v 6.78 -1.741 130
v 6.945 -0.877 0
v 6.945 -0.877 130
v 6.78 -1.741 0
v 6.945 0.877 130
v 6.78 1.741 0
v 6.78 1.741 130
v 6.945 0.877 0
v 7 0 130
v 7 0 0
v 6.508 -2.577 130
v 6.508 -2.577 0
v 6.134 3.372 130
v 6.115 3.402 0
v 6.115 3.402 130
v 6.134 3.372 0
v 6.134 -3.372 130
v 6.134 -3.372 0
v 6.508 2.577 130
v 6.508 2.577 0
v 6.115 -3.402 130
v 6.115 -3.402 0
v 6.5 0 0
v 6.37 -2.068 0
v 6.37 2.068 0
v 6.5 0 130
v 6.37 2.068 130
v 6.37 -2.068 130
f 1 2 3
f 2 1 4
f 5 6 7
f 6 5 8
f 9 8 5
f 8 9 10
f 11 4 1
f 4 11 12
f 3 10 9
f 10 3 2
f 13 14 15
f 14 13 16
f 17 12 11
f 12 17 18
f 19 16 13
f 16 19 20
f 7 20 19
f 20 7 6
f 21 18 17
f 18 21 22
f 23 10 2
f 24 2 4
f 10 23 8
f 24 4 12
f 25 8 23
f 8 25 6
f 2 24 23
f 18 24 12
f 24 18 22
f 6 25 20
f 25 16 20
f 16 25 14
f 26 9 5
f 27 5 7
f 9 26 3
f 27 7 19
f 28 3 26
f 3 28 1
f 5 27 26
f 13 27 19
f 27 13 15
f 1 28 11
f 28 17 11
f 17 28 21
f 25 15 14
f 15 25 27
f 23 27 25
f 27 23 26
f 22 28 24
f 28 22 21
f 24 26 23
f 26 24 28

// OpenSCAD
$fn = 50;


difference() {
	union() {
		cylinder(h = 130, r = 7.0000000000);
		translate(v = [-13.0000000000, 0, 0]) {
			cylinder(h = 130, r = 7.0000000000);
		}
	}
	union() {
		cylinder(h = 130, r = 3.2500000000);
		cylinder(h = 130, r = 1.8000000000);
		cylinder(h = 130, r = 1.8000000000);
		cylinder(h = 130, r = 1.8000000000);
		translate(v = [-17.5000000000, 0, 0]) {
			hull() {
				translate(v = [-3.7500000000, 0.0000000000, 0]) {
					cylinder(h = 130, r = 10.5000000000);
				}
				translate(v = [3.7500000000, 0.0000000000, 0]) {
					cylinder(h = 130, r = 10.5000000000);
				}
				translate(v = [-3.7500000000, -0.0000000000, 0]) {
					cylinder(h = 130, r = 10.5000000000);
				}
				translate(v = [3.7500000000, -0.0000000000, 0]) {
					cylinder(h = 130, r = 10.5000000000);
				}
			}
		}
		translate(v = [-10.0000000000, 0, 0.0000000000]) {
			cylinder(h = 130, r = 16.5000000000);
		}
	}
}
